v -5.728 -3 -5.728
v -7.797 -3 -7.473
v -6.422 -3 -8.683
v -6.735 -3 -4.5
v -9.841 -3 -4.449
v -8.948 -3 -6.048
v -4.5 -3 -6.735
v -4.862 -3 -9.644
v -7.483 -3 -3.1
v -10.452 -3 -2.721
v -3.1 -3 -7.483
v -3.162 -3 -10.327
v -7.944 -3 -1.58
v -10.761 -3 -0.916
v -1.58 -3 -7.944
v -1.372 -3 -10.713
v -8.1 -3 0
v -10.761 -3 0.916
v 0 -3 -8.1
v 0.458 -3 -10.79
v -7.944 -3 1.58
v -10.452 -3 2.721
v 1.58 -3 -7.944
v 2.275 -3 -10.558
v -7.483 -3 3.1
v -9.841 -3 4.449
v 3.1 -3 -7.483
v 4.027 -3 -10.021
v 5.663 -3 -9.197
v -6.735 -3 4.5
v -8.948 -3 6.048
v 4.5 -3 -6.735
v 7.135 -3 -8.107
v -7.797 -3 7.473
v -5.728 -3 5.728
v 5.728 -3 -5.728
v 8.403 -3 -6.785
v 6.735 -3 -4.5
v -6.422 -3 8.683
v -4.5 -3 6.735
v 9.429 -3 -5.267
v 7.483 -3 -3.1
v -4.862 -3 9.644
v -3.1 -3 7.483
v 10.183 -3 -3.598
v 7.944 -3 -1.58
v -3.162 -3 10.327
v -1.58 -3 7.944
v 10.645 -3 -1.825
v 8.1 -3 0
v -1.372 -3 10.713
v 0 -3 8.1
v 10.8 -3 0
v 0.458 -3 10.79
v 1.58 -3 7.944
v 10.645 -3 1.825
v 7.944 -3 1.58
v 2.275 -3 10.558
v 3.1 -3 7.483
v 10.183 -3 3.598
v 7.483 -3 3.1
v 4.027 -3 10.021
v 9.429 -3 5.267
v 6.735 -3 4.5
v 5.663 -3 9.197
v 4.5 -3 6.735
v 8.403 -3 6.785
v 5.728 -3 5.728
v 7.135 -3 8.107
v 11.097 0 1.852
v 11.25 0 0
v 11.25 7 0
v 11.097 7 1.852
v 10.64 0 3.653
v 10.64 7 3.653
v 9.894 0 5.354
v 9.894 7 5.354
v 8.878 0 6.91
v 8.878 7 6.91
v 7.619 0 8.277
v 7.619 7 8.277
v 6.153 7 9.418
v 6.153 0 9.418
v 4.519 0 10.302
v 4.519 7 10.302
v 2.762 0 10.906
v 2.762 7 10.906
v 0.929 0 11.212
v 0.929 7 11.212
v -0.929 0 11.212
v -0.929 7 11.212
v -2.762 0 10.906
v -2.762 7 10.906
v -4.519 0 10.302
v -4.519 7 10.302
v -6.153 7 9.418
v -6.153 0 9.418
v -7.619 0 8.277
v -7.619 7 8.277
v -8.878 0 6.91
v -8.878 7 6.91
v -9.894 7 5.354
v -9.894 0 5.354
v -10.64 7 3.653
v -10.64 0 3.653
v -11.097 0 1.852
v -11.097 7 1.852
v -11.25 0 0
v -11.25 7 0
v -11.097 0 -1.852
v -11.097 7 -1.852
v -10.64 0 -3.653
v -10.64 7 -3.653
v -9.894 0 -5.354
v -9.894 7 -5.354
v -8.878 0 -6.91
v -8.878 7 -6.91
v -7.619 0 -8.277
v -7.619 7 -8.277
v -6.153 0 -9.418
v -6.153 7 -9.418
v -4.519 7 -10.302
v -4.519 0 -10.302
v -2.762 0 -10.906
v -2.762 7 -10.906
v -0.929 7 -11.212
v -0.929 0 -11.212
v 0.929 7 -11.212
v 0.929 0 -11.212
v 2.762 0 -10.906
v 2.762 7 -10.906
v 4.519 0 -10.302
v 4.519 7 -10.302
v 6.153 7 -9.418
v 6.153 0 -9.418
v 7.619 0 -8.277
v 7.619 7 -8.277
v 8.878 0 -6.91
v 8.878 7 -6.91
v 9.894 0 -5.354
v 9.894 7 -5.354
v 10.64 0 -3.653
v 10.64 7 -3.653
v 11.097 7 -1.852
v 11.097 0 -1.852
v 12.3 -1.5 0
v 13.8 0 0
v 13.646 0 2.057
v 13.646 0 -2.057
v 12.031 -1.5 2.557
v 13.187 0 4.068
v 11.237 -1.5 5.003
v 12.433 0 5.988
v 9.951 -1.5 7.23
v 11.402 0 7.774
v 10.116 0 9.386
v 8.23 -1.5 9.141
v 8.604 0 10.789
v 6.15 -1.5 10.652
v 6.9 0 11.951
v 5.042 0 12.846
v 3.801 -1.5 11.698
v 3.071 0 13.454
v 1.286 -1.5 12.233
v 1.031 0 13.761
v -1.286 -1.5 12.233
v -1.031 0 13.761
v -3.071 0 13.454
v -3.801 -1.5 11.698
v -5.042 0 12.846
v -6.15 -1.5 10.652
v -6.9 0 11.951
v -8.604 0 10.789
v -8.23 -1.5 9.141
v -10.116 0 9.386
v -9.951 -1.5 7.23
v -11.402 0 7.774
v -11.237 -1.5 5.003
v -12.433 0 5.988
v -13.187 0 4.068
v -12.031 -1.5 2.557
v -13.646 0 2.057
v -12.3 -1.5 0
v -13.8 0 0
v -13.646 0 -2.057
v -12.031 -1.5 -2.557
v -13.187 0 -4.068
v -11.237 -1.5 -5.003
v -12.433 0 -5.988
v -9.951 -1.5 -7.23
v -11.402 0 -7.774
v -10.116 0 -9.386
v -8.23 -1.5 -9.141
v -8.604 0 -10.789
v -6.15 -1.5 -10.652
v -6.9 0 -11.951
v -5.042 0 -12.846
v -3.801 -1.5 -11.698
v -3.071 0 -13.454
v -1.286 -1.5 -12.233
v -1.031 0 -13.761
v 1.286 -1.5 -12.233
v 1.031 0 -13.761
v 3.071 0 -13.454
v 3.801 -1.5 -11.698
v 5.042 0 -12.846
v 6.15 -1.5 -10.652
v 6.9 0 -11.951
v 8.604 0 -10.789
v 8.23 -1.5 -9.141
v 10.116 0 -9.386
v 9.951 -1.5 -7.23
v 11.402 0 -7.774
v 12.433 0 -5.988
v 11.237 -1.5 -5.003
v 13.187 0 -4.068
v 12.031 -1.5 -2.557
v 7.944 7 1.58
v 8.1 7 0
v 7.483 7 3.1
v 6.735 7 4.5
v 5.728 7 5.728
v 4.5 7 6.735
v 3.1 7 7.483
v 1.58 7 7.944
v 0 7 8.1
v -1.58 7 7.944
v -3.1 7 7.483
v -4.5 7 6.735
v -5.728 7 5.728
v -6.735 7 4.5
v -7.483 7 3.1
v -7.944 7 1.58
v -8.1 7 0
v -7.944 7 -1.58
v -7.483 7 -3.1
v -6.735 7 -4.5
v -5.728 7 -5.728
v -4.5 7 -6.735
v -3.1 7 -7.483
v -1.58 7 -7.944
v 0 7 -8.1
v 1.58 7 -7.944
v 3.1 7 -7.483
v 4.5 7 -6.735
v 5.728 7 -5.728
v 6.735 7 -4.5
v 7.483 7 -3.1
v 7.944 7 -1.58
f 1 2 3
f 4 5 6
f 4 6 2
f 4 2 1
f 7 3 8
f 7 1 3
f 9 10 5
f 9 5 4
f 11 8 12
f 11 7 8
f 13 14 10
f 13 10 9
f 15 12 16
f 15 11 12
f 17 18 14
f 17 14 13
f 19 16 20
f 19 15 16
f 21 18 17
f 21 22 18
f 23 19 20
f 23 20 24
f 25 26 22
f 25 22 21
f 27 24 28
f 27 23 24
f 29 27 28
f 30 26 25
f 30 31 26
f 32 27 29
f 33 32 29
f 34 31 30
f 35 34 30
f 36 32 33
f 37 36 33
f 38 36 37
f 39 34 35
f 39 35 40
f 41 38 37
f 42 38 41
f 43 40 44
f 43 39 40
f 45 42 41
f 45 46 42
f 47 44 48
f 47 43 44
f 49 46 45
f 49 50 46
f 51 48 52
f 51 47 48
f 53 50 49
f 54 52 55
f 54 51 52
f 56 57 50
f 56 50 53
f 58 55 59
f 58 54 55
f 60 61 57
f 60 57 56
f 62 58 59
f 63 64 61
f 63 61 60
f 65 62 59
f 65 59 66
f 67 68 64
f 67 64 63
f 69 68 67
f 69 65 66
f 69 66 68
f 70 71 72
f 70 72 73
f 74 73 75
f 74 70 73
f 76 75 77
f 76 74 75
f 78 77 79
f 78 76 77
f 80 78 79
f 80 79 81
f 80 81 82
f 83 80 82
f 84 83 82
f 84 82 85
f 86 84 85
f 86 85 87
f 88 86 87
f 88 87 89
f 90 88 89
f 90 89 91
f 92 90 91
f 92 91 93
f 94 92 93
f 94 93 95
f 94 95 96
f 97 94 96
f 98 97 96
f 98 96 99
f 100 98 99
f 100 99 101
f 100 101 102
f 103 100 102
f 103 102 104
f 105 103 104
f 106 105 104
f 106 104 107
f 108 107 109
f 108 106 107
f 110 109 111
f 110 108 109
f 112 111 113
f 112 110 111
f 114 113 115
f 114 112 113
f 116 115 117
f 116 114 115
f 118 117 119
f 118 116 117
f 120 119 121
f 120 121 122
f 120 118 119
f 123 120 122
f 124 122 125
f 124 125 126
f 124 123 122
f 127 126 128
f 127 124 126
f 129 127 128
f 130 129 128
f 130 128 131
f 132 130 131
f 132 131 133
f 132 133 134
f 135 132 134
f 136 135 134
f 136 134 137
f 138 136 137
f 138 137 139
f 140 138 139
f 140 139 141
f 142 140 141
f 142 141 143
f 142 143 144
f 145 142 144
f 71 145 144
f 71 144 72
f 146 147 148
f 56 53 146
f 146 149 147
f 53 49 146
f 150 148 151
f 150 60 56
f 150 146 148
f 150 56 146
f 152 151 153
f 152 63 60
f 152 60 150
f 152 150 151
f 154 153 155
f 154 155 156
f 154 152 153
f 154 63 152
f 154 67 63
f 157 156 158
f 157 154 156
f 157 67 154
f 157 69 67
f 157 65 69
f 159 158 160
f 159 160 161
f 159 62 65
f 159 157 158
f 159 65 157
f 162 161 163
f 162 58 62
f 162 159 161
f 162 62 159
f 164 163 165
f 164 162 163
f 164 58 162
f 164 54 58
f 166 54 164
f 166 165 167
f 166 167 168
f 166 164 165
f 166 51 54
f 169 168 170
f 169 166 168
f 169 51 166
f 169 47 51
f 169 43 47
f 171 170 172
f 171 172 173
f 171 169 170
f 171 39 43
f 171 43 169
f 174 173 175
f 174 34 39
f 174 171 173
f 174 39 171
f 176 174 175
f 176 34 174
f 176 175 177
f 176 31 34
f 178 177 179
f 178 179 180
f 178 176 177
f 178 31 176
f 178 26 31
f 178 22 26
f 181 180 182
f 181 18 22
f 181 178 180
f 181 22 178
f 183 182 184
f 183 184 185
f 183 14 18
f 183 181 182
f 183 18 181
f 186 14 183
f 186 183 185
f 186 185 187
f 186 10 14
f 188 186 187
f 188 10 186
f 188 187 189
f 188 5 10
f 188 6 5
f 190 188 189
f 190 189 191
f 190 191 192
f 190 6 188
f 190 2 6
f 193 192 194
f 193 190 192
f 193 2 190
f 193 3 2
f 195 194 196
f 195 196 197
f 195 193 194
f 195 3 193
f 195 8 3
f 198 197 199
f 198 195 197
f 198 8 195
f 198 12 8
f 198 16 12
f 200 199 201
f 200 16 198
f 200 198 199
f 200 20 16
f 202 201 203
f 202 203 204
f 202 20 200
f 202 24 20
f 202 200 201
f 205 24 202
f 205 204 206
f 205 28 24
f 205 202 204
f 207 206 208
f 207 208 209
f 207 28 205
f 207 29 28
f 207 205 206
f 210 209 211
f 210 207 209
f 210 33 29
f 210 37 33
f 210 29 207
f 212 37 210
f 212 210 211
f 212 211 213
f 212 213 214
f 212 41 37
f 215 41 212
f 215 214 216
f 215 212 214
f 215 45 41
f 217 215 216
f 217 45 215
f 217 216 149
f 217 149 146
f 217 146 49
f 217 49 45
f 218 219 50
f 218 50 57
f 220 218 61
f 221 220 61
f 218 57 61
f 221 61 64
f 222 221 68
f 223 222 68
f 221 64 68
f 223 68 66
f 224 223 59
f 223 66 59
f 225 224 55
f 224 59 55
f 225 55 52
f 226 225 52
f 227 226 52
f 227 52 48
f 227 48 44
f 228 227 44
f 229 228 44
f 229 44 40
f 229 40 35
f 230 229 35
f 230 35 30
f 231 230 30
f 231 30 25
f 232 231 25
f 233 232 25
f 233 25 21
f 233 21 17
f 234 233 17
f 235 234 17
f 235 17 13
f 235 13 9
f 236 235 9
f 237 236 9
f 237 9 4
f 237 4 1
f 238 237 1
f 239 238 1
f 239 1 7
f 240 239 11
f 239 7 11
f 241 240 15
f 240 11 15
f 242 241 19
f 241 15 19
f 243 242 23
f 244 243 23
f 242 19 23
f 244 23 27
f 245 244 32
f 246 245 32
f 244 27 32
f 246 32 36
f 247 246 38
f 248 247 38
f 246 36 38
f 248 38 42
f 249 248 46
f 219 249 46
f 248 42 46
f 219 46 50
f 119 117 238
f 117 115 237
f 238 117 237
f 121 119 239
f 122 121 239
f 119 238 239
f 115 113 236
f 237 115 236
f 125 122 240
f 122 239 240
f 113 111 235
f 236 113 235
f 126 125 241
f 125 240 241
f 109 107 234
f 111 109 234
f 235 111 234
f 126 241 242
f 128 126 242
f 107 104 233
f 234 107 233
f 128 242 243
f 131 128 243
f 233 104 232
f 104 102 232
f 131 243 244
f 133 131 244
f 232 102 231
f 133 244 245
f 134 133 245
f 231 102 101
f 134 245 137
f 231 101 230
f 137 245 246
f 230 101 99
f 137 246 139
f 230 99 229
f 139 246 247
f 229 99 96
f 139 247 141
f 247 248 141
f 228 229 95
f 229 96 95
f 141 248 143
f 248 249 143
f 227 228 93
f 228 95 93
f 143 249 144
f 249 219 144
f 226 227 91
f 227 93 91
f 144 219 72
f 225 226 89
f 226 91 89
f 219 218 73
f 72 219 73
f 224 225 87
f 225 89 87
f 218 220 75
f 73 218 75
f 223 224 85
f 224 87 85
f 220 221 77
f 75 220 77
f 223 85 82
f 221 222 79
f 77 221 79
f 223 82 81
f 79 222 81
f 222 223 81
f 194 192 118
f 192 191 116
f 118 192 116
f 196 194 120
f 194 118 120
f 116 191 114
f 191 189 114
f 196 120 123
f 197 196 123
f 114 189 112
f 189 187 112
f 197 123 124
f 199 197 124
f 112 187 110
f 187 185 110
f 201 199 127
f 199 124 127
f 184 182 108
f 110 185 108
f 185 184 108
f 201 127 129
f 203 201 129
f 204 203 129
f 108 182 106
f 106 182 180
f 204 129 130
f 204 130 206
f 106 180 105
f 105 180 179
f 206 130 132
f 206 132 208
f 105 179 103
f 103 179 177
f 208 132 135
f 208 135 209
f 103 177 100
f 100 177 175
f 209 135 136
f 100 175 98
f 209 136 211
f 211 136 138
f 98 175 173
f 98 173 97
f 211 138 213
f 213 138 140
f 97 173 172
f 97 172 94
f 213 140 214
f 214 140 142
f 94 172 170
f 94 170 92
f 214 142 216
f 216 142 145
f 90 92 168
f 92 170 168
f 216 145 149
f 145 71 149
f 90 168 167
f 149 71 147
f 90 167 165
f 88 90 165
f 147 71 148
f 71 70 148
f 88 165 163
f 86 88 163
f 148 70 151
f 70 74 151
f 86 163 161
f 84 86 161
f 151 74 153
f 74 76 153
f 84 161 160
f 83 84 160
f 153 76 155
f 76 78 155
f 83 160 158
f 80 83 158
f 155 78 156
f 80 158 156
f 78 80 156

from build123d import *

# Parameters (mm, degrees)
F0_R     = 13.8
F1_DEPTH = 3
F2_R     = 8.1
F3_DEPTH = 25
F2_R_2   = 11.25
F4_DEPTH = 10
F5_SIZE  = 2.99999


# Not quite as in the source:
# - a fillet or chamfer is up to 0.001 mm smaller than in the source, because OpenCascade refuses the exact size


with BuildPart() as f1:
    # F0 (on Front) → F1 (new body)
    with BuildSketch(Plane.XZ):
        Circle(F0_R)
    extrude(amount=F1_DEPTH)

    # F2 (on face) → F3 (cut)
    with BuildSketch(Plane.XZ.offset(3)):
        Circle(F2_R)
    extrude(amount=-F3_DEPTH, mode=Mode.SUBTRACT)

    # F2 (on face) → F4 (join)
    with BuildSketch(Plane.XZ.offset(3)):
        Circle(F2_R_2)
        Circle(F2_R, mode=Mode.SUBTRACT)
    extrude(amount=-F4_DEPTH)

    # F5 (size 3 in the source; OpenCascade refuses exactly that, so slightly less here)
    f5_edges = [f1.edges().sort_by_distance(p)[0] for p in [
        (-13.8, -3, 0),
    ]]
    chamfer(f5_edges, length=F5_SIZE)


solid = f1.part
